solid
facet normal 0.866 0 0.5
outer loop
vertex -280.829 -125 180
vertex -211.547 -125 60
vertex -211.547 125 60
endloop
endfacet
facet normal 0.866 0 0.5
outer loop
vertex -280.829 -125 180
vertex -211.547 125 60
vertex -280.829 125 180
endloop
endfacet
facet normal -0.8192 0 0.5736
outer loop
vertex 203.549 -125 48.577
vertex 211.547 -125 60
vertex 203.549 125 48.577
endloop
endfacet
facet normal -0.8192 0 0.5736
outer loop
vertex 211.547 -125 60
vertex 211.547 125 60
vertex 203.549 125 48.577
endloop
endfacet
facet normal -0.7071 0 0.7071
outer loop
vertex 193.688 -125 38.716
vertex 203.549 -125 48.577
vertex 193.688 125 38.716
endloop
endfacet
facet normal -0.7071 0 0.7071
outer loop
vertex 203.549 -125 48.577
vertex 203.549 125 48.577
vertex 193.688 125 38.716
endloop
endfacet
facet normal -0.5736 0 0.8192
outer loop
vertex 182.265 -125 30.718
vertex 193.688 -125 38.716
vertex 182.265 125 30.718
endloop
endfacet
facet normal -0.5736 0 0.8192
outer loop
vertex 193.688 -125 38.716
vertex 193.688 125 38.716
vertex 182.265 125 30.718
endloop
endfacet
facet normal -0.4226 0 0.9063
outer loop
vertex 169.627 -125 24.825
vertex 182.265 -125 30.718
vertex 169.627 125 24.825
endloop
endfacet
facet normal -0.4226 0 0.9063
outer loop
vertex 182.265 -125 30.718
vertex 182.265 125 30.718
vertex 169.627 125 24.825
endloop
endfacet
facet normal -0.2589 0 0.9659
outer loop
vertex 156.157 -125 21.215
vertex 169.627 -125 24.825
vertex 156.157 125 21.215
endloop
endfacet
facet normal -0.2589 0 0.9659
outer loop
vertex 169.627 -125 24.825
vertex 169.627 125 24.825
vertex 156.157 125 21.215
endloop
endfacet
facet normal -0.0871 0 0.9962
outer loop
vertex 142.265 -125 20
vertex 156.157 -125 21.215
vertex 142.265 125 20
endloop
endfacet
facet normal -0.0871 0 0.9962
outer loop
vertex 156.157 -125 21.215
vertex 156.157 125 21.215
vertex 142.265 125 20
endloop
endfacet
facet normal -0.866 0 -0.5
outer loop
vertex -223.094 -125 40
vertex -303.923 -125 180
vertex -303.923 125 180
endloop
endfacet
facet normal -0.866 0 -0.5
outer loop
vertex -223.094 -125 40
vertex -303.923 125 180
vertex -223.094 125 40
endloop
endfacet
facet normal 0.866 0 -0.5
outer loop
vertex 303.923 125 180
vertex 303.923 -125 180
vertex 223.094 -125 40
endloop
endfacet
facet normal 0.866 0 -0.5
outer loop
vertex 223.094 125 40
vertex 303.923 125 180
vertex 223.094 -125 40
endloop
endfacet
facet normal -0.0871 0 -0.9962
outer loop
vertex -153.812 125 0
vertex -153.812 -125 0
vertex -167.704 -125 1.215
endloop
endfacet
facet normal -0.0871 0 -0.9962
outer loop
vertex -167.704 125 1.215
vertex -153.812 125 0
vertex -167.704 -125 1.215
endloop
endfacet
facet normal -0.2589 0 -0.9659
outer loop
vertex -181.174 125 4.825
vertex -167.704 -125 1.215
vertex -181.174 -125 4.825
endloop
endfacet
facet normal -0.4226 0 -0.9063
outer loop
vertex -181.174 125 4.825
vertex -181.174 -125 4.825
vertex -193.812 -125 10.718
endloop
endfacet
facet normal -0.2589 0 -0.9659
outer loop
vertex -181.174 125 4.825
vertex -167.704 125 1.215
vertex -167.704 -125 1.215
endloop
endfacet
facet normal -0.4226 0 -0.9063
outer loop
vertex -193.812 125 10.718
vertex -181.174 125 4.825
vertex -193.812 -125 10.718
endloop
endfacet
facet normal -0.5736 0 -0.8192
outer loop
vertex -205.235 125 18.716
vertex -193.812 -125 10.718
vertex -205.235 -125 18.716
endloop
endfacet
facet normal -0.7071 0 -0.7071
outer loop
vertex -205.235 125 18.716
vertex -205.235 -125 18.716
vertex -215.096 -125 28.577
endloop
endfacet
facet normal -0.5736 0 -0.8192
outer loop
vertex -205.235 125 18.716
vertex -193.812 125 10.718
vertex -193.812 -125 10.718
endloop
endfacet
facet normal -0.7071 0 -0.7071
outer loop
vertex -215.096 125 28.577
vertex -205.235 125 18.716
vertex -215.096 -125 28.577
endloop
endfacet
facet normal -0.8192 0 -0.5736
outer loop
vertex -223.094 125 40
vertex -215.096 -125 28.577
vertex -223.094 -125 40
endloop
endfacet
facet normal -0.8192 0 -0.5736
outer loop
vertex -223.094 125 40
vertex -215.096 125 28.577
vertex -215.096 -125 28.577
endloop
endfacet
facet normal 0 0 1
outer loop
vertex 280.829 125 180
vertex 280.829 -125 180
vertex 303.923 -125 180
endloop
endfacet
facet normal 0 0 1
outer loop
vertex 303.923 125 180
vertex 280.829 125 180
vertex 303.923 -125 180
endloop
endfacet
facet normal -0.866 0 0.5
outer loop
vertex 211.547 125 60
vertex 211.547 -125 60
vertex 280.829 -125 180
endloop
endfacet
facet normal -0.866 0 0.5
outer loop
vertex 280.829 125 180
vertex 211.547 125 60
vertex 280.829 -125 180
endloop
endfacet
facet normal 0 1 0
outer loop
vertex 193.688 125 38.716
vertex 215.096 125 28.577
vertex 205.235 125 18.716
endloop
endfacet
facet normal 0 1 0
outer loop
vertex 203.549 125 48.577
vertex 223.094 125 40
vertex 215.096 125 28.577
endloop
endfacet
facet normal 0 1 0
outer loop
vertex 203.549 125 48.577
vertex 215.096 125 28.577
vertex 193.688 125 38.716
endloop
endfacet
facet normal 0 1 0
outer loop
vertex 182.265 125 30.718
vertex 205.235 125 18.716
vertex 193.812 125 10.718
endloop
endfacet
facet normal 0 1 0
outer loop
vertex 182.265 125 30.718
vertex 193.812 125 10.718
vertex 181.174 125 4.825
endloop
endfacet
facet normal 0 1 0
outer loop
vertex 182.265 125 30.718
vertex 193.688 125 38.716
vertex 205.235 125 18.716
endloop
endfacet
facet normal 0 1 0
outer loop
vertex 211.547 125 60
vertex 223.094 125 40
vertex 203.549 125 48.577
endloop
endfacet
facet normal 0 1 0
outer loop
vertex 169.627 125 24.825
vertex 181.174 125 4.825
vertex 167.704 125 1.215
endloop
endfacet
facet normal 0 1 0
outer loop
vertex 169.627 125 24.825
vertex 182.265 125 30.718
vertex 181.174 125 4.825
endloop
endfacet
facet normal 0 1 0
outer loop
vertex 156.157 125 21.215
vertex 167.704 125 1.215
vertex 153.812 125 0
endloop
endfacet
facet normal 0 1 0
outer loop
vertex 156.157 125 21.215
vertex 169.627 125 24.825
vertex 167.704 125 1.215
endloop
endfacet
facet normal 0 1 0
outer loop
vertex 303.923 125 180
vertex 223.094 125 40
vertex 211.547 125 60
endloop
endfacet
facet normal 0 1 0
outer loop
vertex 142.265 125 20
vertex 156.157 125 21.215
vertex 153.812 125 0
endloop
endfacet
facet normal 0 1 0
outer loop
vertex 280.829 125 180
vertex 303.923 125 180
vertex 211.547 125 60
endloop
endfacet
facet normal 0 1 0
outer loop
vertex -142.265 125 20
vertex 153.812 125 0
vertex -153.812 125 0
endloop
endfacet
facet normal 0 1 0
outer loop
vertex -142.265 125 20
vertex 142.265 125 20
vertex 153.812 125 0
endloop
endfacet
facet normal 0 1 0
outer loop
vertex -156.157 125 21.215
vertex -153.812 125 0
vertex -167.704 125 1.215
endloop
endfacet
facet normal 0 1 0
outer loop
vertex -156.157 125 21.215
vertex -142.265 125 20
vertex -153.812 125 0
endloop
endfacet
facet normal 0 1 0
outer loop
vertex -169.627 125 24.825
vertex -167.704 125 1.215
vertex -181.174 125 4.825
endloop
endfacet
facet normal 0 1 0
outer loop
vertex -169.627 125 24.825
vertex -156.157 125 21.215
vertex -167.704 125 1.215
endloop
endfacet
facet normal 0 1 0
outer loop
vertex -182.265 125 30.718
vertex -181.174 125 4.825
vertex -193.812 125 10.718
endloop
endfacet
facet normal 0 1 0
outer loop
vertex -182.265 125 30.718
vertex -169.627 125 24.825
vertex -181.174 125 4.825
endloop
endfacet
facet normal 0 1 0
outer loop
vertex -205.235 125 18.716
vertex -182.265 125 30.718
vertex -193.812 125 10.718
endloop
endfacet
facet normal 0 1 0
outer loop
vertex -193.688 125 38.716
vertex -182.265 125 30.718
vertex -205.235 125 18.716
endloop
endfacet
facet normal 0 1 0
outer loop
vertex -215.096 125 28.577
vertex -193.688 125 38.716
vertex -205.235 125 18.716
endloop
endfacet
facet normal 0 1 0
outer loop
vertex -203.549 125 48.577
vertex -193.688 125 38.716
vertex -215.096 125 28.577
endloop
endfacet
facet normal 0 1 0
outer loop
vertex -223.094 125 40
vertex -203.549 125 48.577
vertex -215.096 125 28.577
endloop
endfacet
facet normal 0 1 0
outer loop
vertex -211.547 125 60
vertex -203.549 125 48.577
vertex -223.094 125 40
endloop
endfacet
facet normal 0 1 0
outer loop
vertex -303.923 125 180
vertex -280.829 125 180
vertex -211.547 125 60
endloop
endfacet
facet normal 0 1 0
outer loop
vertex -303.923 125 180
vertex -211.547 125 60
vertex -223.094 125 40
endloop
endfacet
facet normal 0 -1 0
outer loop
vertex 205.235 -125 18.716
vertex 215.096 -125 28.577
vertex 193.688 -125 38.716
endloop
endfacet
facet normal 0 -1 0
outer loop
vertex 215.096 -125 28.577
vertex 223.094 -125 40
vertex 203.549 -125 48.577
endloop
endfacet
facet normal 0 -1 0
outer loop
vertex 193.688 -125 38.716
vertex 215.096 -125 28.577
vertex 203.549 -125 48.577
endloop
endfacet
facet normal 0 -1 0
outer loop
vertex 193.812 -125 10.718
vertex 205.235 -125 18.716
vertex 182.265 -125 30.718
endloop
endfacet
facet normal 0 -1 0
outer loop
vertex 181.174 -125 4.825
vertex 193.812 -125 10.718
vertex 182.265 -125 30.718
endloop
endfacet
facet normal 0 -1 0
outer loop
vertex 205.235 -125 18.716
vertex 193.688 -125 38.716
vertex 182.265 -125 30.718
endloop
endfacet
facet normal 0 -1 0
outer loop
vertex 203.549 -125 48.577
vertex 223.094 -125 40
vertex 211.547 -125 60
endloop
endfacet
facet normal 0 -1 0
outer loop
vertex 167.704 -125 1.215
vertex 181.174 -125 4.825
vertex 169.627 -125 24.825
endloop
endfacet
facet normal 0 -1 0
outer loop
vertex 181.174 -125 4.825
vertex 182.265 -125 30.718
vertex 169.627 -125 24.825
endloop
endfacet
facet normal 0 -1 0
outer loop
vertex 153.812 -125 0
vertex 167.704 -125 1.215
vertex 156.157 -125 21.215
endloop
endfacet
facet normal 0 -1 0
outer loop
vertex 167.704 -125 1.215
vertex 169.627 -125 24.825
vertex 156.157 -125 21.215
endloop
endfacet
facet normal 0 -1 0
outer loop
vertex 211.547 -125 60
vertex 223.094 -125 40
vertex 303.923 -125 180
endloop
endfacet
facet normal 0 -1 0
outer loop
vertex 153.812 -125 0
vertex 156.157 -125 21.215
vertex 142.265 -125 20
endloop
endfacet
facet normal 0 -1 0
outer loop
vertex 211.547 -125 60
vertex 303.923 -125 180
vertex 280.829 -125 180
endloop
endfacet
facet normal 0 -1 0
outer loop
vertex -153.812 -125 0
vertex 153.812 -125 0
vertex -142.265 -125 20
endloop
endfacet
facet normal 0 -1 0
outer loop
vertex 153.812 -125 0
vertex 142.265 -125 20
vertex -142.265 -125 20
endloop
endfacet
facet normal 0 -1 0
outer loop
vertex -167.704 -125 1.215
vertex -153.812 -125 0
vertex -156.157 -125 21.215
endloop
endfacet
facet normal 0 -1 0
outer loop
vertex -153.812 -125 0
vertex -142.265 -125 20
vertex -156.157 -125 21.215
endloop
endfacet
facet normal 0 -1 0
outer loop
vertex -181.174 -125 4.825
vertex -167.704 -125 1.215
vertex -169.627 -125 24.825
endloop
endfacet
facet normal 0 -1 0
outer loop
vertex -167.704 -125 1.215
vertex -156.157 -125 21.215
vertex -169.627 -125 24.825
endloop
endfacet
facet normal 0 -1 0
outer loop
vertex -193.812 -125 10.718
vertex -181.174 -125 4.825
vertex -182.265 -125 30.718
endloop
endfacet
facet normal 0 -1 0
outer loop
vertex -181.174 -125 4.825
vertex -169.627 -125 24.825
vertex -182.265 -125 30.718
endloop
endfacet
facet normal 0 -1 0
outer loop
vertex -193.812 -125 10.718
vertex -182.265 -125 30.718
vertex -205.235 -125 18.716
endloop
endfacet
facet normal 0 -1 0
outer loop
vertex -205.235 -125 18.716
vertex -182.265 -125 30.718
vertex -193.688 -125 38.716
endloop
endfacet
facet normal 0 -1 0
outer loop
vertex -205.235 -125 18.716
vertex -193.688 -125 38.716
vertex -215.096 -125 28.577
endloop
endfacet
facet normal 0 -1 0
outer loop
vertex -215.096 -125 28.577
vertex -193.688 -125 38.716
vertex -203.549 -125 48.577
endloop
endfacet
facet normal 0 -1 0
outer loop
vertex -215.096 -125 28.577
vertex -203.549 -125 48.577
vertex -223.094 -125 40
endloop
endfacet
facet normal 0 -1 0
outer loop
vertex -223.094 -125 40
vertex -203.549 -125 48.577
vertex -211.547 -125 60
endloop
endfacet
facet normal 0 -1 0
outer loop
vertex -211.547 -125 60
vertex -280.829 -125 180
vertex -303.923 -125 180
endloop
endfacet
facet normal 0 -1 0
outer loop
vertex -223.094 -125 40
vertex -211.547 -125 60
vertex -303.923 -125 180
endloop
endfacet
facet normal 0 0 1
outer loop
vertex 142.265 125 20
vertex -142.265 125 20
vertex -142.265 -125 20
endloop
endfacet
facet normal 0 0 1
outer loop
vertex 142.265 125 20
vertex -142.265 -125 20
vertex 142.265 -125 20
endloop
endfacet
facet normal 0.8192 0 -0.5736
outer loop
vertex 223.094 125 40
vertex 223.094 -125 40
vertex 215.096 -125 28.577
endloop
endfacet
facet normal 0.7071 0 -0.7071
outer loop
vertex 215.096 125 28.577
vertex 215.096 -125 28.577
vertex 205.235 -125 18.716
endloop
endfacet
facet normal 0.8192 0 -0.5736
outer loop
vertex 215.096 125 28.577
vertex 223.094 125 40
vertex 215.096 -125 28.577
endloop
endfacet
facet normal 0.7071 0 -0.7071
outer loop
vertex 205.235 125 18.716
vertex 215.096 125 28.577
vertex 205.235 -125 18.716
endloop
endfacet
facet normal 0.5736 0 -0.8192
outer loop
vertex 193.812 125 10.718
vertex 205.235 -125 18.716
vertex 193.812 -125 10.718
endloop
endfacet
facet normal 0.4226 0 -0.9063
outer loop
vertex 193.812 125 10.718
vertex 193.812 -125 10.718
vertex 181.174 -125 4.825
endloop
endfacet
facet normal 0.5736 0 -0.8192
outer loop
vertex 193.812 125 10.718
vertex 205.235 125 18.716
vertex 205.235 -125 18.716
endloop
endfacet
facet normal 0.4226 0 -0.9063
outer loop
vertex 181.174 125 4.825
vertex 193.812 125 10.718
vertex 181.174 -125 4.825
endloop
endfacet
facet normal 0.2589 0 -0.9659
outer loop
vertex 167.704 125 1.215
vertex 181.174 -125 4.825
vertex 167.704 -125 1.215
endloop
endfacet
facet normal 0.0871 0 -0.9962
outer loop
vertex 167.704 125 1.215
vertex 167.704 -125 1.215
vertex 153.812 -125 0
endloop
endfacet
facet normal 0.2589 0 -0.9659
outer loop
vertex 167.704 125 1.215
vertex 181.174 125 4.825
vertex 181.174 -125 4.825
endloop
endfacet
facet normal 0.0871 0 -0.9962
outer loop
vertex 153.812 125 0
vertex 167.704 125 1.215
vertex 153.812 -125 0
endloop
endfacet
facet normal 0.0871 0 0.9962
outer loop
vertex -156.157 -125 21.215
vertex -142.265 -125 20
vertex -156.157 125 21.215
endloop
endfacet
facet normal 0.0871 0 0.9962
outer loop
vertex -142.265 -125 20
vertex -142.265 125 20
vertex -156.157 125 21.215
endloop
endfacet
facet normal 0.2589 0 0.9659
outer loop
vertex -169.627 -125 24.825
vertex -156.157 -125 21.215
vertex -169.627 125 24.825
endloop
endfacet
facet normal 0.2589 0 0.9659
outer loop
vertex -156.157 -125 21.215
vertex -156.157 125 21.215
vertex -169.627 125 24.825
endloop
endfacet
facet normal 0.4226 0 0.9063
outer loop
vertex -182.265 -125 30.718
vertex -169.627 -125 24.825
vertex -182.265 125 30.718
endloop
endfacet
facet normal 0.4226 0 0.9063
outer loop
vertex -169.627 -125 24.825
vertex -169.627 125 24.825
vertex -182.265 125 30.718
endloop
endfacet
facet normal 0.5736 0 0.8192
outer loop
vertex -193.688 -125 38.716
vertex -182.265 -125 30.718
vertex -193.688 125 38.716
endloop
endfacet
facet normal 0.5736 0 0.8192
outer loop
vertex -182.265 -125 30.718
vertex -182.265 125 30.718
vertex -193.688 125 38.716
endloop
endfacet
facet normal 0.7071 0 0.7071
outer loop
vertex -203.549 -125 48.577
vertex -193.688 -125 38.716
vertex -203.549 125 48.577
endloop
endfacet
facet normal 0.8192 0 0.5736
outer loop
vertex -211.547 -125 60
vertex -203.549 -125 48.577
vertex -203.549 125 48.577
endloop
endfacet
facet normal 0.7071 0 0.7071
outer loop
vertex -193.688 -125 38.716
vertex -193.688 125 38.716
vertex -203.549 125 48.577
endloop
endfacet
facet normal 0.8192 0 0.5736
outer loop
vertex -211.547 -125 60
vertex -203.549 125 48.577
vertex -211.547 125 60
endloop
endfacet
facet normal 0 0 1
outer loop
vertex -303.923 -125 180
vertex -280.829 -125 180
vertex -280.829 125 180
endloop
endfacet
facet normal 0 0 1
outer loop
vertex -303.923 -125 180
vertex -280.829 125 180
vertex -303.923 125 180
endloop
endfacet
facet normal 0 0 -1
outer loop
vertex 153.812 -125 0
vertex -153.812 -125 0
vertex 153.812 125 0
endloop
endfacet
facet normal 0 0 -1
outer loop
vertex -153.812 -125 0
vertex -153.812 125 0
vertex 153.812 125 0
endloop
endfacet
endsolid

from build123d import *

# Parameters (mm, degrees)
F0_W     = 400
F0_H     = 250
F1_DEPTH = 20
F3_DEPTH = 250
F4_R     = 80


# Not quite as in the source:
# - a pattern or mirror of a feature is missing from the dataset's text; its kind, count and spacing are read off the source's solid


with BuildPart() as f1:
    # F0 (on Top) → F1 (new body)
    with BuildSketch(Plane.XY):
        Rectangle(F0_W, F0_H)
    extrude(amount=F1_DEPTH)

    # F2 (on face) → F3 (join, through all)
    with BuildSketch(Plane.XZ.offset(125)):
        Polygon((-303.9230484541, 180), (-200, 0), (-188.4529946162, 20), (-280.8290376865, 180), align=None)
    f3 = extrude(amount=-F3_DEPTH)

    # F3_copies: F3 across plane
    add(f3.mirror(Plane(origin=(0, 0, 0), x_dir=(0, 0, 1), z_dir=(1, 0, 0))))

    # F4
    f4_edges = [f1.edges().sort_by_distance(p)[0] for p in [
        (-188.452995, 0, 20),
        (-200, 0, 0),
        (188.452995, 0, 20),
        (200, 0, 0),
    ]]
    fillet(f4_edges, radius=F4_R)


solid = f1.part
